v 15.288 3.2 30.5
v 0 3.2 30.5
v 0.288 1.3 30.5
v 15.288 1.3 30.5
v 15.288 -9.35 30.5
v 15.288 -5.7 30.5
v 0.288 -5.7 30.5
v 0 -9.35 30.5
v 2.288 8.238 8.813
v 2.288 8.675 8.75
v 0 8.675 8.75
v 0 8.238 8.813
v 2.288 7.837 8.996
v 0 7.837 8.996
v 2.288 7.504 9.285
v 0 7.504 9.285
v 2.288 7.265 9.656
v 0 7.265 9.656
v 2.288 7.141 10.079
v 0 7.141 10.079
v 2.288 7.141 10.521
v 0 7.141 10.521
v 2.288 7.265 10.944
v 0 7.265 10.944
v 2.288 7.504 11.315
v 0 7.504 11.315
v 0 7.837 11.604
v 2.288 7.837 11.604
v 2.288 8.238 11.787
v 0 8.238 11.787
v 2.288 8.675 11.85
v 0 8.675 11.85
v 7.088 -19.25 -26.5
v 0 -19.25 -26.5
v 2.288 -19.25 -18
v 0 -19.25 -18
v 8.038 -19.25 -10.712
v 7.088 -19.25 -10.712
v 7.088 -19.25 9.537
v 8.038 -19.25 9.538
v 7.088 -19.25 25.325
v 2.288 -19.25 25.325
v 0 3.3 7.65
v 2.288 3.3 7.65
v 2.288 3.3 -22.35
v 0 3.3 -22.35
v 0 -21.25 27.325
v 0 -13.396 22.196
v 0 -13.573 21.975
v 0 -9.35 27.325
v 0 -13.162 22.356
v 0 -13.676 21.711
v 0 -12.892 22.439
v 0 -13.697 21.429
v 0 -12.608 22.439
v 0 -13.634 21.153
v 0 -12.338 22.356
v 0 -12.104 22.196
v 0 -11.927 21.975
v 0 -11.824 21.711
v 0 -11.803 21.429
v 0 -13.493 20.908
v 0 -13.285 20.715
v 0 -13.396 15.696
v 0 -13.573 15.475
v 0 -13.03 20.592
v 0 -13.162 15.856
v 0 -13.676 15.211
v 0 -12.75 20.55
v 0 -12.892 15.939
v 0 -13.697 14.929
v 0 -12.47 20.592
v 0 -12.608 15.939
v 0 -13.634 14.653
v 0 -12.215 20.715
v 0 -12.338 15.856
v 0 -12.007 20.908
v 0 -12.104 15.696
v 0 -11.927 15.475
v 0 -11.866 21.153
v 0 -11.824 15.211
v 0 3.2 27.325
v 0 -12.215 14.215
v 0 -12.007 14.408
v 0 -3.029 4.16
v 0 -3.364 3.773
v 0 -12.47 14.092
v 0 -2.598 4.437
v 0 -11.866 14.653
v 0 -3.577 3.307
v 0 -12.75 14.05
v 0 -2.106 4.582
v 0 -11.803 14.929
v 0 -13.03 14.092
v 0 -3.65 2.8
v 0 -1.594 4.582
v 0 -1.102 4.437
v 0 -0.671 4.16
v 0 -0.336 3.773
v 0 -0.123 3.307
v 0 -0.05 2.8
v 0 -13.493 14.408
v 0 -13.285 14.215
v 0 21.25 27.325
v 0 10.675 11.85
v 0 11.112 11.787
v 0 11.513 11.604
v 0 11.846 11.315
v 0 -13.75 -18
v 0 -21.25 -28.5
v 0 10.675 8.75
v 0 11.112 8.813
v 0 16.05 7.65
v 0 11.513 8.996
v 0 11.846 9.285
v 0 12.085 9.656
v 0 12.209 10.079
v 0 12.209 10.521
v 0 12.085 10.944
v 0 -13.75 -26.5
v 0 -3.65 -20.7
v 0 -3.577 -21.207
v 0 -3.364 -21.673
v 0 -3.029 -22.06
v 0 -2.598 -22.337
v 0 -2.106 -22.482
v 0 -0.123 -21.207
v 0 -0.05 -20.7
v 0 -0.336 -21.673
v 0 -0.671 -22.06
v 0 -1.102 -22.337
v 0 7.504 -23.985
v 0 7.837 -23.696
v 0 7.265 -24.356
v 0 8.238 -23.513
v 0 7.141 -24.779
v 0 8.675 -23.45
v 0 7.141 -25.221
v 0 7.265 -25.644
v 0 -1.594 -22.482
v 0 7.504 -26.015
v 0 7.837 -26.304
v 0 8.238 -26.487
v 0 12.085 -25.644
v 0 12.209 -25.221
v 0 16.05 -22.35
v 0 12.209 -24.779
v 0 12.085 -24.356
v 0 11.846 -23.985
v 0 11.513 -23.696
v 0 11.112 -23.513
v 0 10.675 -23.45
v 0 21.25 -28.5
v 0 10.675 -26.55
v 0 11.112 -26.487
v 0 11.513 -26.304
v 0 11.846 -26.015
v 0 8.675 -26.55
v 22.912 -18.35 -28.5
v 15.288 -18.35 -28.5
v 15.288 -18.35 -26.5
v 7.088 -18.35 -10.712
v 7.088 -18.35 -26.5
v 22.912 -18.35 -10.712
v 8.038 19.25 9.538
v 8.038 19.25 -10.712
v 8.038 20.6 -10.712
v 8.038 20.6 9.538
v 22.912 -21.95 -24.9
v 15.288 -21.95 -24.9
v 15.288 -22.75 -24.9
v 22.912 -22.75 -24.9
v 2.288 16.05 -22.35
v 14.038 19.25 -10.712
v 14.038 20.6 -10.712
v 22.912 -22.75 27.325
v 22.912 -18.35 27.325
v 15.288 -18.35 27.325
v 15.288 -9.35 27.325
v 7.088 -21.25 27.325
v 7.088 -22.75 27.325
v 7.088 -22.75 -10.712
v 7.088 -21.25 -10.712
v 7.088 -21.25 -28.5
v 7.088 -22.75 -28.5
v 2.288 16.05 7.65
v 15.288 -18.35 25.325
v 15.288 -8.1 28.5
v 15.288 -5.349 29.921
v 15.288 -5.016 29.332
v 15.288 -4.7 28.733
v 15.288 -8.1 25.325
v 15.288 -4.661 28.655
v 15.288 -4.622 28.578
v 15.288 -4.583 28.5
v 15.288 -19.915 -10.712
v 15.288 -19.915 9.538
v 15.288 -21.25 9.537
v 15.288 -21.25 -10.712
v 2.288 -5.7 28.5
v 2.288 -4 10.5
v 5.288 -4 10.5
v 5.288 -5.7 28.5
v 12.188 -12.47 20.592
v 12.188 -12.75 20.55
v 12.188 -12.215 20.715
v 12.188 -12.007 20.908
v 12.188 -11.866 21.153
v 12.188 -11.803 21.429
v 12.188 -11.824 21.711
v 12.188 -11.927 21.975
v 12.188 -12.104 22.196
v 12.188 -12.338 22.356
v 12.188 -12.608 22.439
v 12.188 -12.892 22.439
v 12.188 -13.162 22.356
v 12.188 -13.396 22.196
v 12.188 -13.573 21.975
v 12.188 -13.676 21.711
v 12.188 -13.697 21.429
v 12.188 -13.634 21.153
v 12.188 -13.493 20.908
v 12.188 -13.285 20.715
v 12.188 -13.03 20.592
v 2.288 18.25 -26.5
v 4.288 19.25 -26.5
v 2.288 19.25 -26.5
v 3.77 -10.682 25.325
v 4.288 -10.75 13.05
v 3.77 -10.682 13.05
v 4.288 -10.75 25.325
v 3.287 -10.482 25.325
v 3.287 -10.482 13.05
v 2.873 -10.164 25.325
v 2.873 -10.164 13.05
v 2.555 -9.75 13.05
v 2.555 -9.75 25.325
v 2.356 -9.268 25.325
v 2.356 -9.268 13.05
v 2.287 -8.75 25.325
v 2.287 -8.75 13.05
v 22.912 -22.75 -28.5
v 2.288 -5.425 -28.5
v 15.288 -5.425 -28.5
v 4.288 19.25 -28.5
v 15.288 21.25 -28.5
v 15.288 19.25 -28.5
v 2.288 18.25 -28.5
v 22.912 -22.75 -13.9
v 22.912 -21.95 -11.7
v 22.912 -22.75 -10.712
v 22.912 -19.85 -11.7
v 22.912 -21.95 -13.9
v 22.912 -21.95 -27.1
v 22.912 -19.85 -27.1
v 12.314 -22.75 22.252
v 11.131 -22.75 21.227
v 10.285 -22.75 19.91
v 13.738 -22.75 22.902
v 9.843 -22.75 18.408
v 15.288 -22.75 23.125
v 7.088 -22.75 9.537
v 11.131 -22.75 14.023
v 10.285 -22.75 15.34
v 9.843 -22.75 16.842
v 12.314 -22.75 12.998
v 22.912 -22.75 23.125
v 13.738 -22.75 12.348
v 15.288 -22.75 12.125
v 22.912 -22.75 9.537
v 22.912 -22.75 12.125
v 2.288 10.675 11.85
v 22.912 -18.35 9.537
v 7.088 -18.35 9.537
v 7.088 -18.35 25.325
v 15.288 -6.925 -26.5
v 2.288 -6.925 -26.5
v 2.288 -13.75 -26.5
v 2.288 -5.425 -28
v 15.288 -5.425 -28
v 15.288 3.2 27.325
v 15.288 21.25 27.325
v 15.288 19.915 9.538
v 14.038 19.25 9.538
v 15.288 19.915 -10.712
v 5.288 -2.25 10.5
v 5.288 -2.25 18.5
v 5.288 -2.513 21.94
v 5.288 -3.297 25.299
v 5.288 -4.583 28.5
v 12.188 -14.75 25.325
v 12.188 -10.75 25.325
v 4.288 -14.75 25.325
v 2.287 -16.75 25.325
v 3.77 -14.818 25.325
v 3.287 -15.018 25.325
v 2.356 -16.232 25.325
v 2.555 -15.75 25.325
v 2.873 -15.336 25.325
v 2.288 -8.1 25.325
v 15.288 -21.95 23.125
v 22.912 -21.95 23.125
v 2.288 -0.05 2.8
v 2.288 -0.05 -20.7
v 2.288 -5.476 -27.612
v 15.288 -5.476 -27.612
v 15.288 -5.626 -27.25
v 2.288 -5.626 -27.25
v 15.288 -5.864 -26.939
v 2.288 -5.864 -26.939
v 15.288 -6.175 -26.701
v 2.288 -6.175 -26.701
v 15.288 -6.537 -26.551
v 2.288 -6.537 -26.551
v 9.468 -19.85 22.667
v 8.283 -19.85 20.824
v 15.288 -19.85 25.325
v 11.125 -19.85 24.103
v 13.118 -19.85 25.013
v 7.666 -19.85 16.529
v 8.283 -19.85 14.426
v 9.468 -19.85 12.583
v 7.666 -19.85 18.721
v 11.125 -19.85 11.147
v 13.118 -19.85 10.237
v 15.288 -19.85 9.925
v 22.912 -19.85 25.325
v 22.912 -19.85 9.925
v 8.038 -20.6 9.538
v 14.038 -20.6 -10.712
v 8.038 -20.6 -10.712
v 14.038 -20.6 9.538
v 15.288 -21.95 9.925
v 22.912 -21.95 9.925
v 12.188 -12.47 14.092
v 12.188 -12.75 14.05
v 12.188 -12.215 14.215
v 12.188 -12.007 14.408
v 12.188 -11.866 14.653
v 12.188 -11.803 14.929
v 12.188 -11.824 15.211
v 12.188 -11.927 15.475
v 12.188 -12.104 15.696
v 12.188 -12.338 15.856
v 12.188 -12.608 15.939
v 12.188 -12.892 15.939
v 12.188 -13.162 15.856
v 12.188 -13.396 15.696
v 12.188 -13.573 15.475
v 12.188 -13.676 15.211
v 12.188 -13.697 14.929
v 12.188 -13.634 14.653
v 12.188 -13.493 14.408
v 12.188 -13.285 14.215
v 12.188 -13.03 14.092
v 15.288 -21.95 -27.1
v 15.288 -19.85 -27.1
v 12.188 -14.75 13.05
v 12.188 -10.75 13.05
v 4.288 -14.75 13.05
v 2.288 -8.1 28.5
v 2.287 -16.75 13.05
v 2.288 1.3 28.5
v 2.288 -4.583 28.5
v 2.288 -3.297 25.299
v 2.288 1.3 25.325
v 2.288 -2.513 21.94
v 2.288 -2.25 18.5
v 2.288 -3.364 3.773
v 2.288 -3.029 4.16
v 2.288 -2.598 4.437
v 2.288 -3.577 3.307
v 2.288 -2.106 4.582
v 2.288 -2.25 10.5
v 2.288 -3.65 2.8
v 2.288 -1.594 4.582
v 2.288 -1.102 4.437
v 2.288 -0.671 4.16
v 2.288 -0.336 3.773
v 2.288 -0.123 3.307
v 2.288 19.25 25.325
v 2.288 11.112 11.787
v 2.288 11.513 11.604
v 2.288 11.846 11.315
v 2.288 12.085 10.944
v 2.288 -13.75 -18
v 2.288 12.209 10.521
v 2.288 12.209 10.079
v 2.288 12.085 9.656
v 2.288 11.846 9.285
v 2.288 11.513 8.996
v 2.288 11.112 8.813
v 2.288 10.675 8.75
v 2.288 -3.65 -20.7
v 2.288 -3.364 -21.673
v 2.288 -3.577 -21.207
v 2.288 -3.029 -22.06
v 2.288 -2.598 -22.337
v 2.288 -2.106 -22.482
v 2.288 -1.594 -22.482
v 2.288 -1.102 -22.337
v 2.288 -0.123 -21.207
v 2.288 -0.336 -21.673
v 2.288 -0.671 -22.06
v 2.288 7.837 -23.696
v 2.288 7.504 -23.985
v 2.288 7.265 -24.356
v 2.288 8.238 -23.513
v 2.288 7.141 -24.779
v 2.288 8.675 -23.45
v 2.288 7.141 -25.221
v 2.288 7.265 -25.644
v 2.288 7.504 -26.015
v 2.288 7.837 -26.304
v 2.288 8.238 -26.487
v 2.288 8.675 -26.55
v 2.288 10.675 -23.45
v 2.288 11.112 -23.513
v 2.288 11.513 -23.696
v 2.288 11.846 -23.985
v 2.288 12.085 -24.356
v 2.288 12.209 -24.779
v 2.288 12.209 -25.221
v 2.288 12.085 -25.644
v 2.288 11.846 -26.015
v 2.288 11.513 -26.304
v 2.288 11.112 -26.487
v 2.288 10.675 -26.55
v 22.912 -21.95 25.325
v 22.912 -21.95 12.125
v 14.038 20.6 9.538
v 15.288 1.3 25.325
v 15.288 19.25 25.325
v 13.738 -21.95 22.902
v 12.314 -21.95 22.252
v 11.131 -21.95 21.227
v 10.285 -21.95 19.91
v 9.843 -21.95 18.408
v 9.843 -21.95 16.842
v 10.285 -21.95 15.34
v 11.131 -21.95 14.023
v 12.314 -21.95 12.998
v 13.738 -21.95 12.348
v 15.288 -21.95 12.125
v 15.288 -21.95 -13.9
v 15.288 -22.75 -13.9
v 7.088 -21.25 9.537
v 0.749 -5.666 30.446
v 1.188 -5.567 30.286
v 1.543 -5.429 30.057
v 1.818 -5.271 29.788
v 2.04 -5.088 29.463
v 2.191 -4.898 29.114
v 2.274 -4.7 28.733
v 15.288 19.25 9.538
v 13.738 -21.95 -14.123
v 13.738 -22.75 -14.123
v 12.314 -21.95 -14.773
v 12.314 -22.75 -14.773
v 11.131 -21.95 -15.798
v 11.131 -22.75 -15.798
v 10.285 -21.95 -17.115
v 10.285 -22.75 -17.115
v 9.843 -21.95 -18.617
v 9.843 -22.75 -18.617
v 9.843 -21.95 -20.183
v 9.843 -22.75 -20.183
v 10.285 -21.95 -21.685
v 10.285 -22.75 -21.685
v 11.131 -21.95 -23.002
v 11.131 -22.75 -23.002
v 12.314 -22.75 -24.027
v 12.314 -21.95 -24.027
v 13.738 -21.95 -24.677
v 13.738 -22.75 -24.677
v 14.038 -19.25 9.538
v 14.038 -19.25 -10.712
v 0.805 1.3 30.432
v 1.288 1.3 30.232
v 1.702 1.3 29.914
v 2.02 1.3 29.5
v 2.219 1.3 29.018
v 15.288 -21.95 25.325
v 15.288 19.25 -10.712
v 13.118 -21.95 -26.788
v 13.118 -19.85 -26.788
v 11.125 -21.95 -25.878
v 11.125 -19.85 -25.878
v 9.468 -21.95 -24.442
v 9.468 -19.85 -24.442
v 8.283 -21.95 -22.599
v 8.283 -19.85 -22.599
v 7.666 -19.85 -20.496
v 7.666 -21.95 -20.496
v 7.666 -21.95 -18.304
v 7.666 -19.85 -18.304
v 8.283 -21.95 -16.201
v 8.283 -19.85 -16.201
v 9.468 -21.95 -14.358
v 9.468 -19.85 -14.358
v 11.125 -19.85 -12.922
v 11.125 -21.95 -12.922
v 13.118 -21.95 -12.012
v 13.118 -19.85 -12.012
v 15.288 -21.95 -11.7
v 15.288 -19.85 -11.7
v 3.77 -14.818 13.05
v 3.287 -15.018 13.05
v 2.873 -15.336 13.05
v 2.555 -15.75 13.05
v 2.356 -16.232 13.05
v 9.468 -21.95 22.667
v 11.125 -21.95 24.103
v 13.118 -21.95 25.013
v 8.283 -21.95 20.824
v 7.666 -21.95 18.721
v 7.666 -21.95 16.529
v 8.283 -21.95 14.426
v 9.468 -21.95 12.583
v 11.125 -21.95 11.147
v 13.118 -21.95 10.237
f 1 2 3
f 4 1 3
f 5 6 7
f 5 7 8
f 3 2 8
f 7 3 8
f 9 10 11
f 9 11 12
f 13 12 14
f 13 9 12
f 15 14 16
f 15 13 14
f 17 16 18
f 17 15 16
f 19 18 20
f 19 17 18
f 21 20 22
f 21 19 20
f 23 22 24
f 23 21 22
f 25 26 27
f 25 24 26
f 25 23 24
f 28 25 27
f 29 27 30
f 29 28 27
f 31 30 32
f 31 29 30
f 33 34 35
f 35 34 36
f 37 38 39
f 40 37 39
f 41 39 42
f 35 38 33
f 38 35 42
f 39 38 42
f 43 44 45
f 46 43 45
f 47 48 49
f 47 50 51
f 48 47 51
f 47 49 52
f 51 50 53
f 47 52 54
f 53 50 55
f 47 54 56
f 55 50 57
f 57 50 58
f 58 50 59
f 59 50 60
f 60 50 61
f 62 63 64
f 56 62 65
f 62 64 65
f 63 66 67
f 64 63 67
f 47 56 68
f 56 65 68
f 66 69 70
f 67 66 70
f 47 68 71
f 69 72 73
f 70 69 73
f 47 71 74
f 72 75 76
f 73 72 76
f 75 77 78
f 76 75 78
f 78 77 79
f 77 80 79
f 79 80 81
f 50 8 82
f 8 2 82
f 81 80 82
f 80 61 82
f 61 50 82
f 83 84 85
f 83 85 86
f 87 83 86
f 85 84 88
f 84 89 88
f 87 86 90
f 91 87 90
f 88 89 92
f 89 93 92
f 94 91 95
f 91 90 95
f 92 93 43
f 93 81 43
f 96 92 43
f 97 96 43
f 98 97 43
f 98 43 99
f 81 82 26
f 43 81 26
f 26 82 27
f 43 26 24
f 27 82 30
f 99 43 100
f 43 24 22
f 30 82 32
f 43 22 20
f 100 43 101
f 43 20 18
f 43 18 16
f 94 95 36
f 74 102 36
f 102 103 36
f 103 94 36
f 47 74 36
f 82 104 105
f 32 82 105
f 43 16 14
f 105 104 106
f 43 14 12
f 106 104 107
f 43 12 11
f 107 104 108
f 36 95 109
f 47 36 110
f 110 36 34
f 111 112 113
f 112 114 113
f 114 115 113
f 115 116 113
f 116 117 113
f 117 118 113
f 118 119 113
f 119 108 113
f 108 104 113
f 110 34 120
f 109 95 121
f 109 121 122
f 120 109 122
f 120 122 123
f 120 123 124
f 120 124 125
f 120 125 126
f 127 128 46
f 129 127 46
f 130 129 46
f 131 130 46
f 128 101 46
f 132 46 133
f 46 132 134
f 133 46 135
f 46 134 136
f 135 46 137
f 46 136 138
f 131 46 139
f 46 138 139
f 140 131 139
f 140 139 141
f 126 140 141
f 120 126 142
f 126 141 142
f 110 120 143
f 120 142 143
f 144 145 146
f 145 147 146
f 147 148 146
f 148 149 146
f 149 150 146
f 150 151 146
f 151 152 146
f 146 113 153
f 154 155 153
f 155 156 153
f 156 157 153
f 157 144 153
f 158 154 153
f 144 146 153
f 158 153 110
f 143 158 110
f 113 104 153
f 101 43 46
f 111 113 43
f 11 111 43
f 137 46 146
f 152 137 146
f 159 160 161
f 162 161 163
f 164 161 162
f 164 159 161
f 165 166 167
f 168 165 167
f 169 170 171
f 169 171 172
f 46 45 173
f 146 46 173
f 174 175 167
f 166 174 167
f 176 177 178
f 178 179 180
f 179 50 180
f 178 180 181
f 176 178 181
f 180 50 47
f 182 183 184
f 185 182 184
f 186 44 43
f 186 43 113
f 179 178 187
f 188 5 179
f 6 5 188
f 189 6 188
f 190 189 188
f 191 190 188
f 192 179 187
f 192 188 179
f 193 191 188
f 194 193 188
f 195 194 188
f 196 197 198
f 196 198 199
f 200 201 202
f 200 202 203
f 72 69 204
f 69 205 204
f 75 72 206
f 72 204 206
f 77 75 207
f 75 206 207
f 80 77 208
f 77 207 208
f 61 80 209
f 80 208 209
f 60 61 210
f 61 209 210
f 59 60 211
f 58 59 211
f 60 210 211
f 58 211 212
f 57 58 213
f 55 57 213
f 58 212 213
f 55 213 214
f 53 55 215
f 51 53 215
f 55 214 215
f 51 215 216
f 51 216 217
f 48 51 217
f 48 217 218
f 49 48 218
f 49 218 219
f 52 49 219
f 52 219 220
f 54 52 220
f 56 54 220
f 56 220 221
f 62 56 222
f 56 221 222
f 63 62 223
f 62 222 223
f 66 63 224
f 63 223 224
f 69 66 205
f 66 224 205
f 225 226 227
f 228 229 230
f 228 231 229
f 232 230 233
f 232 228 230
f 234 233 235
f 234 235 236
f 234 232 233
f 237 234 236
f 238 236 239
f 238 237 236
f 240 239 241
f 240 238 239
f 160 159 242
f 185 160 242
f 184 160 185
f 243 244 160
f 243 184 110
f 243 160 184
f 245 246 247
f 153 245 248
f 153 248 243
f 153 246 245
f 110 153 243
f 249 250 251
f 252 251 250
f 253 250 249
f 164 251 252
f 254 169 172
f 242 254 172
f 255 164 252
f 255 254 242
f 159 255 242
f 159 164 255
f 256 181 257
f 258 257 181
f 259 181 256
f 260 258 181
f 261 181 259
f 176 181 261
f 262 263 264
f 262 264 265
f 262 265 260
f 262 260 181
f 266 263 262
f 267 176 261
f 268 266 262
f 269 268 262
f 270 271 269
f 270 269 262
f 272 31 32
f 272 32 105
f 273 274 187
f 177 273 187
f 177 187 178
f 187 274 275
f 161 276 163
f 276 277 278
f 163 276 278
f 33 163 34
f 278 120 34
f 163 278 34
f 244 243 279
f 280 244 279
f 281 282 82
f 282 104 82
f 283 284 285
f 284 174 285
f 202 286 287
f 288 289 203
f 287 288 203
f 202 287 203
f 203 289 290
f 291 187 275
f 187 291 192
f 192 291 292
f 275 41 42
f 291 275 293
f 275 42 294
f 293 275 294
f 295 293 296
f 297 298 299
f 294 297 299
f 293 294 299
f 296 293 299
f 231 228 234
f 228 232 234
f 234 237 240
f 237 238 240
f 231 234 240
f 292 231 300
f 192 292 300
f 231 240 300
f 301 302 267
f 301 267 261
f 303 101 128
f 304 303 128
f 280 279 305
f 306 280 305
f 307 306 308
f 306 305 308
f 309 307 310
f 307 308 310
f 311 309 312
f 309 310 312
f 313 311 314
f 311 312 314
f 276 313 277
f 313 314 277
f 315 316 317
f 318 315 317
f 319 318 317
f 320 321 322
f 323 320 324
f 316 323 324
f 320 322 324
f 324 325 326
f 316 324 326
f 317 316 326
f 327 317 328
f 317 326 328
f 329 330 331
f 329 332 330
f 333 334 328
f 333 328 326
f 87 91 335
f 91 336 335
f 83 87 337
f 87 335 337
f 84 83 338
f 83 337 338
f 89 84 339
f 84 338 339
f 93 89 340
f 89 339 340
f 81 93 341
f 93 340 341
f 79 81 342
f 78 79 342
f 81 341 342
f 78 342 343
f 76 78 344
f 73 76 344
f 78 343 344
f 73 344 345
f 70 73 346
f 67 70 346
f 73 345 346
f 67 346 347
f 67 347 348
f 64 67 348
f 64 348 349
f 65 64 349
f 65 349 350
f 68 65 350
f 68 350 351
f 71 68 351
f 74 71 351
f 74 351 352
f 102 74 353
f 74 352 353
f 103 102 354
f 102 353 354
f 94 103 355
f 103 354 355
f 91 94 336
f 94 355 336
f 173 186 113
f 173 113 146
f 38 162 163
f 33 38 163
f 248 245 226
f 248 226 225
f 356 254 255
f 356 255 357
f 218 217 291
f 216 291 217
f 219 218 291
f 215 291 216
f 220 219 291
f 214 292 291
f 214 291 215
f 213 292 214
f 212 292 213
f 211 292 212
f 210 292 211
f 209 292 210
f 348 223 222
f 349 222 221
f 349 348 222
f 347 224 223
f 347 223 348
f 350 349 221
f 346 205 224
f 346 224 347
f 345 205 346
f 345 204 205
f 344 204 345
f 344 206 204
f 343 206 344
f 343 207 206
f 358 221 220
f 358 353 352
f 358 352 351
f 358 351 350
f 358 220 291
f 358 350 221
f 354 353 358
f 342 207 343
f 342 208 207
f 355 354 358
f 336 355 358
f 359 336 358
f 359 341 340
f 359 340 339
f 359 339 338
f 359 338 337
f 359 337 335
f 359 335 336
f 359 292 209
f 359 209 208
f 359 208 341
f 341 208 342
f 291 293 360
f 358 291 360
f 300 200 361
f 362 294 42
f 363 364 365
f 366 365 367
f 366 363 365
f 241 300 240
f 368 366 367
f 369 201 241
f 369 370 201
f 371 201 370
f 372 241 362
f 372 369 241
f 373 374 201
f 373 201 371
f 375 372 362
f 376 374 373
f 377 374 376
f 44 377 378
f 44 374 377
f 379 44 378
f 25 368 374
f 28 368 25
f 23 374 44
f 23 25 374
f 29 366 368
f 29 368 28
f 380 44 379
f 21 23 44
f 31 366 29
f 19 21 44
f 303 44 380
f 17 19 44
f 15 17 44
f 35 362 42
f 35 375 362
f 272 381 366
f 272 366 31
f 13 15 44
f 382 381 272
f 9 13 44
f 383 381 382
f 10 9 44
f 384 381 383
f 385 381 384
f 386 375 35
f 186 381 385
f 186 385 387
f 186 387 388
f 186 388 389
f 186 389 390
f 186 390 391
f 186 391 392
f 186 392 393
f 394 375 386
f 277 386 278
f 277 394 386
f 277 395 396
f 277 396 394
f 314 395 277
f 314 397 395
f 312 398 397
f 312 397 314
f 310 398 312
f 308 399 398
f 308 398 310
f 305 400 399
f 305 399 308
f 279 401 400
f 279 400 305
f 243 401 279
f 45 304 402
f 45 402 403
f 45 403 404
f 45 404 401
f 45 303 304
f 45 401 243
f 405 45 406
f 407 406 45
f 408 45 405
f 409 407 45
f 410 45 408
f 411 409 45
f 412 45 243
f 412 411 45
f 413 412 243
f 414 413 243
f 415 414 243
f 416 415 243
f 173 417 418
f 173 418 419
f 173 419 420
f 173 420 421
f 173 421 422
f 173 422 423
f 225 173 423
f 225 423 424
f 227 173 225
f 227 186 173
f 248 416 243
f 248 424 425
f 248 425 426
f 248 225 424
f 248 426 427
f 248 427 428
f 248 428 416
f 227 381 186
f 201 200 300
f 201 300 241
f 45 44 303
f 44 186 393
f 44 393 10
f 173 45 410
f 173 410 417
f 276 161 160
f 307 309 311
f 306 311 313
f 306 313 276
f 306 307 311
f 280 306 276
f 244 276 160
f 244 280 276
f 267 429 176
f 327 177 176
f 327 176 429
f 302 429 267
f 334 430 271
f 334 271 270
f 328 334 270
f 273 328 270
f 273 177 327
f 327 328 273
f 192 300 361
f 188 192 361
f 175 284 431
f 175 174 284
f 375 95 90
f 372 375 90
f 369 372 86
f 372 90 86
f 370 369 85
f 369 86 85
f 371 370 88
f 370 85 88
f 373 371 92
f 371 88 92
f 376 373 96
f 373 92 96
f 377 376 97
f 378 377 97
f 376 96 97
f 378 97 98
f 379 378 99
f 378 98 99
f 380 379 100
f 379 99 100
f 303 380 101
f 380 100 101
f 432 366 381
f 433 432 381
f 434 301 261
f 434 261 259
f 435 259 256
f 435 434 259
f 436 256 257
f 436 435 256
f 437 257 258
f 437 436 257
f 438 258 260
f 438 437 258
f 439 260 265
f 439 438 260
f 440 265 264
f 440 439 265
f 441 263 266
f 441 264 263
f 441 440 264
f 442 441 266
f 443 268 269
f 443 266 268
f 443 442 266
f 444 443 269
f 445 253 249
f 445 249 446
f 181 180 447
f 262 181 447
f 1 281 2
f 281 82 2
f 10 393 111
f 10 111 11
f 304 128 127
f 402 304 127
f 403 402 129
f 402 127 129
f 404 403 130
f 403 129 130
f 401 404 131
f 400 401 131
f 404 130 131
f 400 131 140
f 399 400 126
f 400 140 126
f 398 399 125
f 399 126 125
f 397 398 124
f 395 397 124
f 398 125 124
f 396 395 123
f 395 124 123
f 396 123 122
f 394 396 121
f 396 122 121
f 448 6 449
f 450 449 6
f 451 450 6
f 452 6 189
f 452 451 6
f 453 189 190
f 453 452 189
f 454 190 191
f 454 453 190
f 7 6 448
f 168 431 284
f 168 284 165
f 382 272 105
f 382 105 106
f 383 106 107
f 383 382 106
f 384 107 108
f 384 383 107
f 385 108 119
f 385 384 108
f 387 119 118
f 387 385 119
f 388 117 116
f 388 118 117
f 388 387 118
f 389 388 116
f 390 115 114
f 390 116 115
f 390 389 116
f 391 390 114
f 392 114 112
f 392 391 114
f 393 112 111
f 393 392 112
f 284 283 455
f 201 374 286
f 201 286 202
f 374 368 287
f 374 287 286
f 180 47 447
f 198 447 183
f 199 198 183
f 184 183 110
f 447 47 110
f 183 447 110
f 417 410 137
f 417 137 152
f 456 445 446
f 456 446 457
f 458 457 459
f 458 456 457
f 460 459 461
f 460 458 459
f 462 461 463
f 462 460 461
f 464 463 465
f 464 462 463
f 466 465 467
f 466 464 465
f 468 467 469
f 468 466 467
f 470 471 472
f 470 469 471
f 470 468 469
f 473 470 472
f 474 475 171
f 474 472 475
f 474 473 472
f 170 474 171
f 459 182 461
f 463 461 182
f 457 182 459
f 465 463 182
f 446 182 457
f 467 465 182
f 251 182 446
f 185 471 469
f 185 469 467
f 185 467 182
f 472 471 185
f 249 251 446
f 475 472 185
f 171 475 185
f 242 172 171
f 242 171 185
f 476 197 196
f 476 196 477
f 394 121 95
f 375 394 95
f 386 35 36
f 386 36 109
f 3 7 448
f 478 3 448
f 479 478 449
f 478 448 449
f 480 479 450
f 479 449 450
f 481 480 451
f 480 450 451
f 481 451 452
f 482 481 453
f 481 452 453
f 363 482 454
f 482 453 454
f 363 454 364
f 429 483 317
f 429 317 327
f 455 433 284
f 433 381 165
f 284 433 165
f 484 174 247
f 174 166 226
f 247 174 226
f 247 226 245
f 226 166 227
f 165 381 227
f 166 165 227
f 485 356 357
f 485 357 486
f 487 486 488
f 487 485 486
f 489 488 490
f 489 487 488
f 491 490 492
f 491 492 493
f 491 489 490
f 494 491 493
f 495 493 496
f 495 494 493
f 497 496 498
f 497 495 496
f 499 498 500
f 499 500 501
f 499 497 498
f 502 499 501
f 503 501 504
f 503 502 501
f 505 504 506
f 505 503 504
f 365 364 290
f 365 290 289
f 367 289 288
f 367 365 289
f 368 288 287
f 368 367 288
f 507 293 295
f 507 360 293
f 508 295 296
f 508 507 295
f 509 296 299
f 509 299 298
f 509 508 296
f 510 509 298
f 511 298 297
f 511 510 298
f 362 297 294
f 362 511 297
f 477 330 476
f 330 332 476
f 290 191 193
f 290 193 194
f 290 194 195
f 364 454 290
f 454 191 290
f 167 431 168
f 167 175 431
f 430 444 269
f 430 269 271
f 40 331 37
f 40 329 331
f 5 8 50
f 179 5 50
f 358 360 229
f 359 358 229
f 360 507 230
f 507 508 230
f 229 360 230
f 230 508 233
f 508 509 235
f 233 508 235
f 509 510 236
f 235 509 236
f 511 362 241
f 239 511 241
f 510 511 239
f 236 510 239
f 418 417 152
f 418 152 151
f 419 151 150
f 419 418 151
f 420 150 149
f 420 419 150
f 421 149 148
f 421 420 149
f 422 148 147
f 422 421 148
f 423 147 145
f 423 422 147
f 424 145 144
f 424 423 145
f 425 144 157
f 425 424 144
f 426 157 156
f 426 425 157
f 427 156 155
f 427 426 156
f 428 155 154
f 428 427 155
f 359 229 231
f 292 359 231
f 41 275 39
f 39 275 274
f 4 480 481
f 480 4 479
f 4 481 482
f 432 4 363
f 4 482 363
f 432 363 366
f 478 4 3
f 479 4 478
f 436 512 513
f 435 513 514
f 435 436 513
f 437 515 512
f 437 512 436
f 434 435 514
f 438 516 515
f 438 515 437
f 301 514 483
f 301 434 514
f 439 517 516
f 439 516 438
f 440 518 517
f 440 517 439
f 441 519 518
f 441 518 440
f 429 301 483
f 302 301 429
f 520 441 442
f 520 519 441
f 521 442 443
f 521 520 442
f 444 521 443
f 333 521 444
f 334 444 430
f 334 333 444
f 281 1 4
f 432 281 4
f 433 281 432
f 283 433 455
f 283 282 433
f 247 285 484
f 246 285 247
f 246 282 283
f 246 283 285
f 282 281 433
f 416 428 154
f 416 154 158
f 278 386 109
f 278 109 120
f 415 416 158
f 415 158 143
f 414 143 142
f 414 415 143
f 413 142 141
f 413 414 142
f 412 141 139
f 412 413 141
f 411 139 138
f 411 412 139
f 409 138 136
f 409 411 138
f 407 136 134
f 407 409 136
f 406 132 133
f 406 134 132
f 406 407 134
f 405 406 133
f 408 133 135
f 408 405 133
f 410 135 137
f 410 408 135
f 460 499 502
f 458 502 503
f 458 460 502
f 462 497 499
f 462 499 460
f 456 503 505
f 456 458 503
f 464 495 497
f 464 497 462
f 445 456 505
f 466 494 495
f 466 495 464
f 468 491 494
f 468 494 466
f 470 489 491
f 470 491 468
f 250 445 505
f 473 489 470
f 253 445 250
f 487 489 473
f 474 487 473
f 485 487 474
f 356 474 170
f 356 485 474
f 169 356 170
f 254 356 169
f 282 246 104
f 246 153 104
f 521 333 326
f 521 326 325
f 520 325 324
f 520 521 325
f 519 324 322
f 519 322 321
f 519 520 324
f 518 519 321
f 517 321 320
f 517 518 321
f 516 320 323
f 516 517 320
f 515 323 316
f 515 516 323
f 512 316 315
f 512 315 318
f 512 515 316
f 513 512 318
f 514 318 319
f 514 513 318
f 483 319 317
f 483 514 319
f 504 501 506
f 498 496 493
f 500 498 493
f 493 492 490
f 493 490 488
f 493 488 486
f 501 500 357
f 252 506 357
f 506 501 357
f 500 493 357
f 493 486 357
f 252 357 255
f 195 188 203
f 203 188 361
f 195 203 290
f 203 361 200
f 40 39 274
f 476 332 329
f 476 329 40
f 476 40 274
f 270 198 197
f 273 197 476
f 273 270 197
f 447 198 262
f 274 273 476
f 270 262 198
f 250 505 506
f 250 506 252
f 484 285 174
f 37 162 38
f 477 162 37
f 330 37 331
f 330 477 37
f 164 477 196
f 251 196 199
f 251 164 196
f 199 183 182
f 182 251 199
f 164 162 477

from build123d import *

# Parameters (mm, degrees)
MAIN_EXTRUDE_DEPTH            = 2.2875
WALLS_START                   = 2.2875
WALLS_DEPTH                   = 13
CORNER_SUPPORT_DEPTH          = 2
SKETCH2_R                     = 0.95
SKETCH2_W                     = 2.4
SKETCH2_H                     = 4
SKETCH2_W_2                   = 1
SWITCH_SPACER_DEPTH           = 9.9
ARM_SUPPORT_EXTRUDE_DEPTH     = 3
ARM_SUPPORT_CURVE_DEPTH       = 40.380356778
FILLET4_R                     = 2
FILLET3_R                     = 2
SKETCH2_5_R                   = 0.95
SWITCH_MOUNT_HOLES_DEPTH      = 40.380356889
SWITCH_MOUNT_HOLES_DEPTH_BACK = 40.380356889
SKETCH4_W                     = 8.5
SKETCH4_H                     = 5.5
WIRE_HOLE_DEPTH               = 40.380356889
SKETCH25_W                    = 6
SKETCH25_H                    = 1.35
FEMALE_SNAP_DEPTH             = 10.125
SKETCH5_W                     = 30
SKETCH5_H                     = 12.75
SERVO_HOLE_DEPTH              = 40.380356889
SKETCH30_W                    = 15.7875
SKETCH30_H                    = 0.9
SKETCH30_W_2                  = 17.7875
SKETCH30_H_2                  = 1.5
MAGNET_EXTRUDE_1_DEPTH        = 7.625
MAGNET_EXTRUDE_1_DEPTH_BACK   = 8.2
SKETCH29_R                    = 7.7
MAGNET_HOLE_DEPTH             = 2.1
SKETCH31_R                    = 5.5
MAGNET_THRU_HOLE_DEPTH        = 58.632218961


with BuildPart() as part:
    # Sketch1 → Main Extrude (new body)
    with BuildSketch(Plane(origin=(0, 0, 0), x_dir=(0, 0, -1), z_dir=(1, 0, 0))):
        Polygon((-30.5, -9.35), (-27.325, -9.35), (-27.325, -21.25), (28.5, -21.25), (28.5, 21.25), (-27.325, 21.25), (-27.325, 3.2), (-30.5, 3.2), align=None)
        with BuildLine():
            Line((20.7, -3.65), (-2.8, -3.65))
            ThreePointArc((-2.8, -3.65), (-4.6, -1.85), (-2.8, -0.05))
            Line((-2.8, -0.05), (20.7, -0.05))
            ThreePointArc((20.7, -0.05), (22.5, -1.85), (20.7, -3.65))
        make_face(mode=Mode.SUBTRACT)
    extrude(amount=MAIN_EXTRUDE_DEPTH)

    # Sketch1_3 → Walls (add)
    with BuildSketch(Plane(origin=(0, 0, 0), x_dir=(0, 0, -1), z_dir=(1, 0, 0)).offset(WALLS_START)):
        Polygon((-25.325, 19.25), (28.5, 19.25), (28.5, 21.25), (-27.325, 21.25), (-27.325, 3.2), (-30.5, 3.2), (-30.5, 1.3), (-25.325, 1.3), align=None)
        with BuildLine():
            Line((28.5, -5.425), (28, -5.425))
            ThreePointArc((28, -5.425), (26.939339828, -5.864339828), (26.5, -6.925))
            Line((26.5, -6.925), (26.5, -19.25))
            Line((26.5, -19.25), (-25.325, -19.25))
            Line((-25.325, -19.25), (-25.325, -8.1))
            Line((-25.325, -8.1), (-28.5, -8.1))
            Line((-28.5, -8.1), (-28.5, -4.45))
            Line((-28.5, -4.45), (-30.5, -4.45))
            Line((-30.5, -4.45), (-30.5, -9.35))
            Line((-30.5, -9.35), (-27.325, -9.35))
            Line((-27.325, -9.35), (-27.325, -21.25))
            Line((-27.325, -21.25), (28.5, -21.25))
            Line((28.5, -21.25), (28.5, -5.425))
        make_face()
    extrude(amount=WALLS_DEPTH)

    # Sketch22 → Corner Support (add)
    with BuildSketch(Plane(origin=(0, 0, -28.5), x_dir=(-1, 0, 0), z_dir=(0, 0, -1))):
        Polygon((-4.2875, 19.25), (-2.2875, 18.25), (-2.2875, 19.25), align=None)
    extrude(amount=-CORNER_SUPPORT_DEPTH)

    # Sketch2 → Switch Spacer (add)
    with BuildSketch(Plane(origin=(2.2875, 0, 0), x_dir=(0, 0, -1), z_dir=(1, 0, 0))):
        Polygon((-14.05, -10.75), (-17.05, -10.75), (-17.05, -14.75), (-14.05, -14.75), (-14.05, -12.75), align=None)
        with Locations((-15, -12.75)):
            Circle(SKETCH2_R, mode=Mode.SUBTRACT)
        with Locations((-15, -12.75)):
            Circle(SKETCH2_R)
        Polygon((-19.45, -10.75), (-22.45, -10.75), (-22.45, -12.75), (-22.45, -14.75), (-19.45, -14.75), align=None)
        with BuildLine():
            ThreePointArc((-20.55, -12.75), (-21.5, -13.7), (-22.45, -12.75))
            ThreePointArc((-22.45, -12.75), (-21.5, -11.8), (-20.55, -12.75))
        make_face(mode=Mode.SUBTRACT)
        with Locations((-21.5, -12.75)):
            Circle(SKETCH2_R)
        Polygon((-22.45, -12.75), (-22.45, -10.75), (-25.325, -10.75), (-25.325, -14.75), (-22.45, -14.75), align=None)
        with Locations((-18.25, -12.75)):
            Rectangle(SKETCH2_W, SKETCH2_H)
        with Locations((-13.55, -12.75)):
            Rectangle(SKETCH2_W_2, SKETCH2_H)
    extrude(amount=SWITCH_SPACER_DEPTH)

    # Sketch3 → Arm Support Extrude (add)
    with BuildSketch(Plane(origin=(2.2875, 0, 0), x_dir=(0, 0, -1), z_dir=(1, 0, 0))):
        with BuildLine():
            Line((-18.5, -2.25), (-10.5, -2.25))
            Line((-10.5, -2.25), (-10.5, -4))
            Line((-10.5, -4), (-28.5, -5.7))
            Line((-28.5, -5.7), (-30.5, -5.7))
            ThreePointArc((-30.5, -5.7), (-24.743046131, -3.129622151), (-18.5, -2.25))
        make_face()
    extrude(amount=ARM_SUPPORT_EXTRUDE_DEPTH)

    # Sketch7 → Arm Support Curve (cut, through all)
    with BuildSketch(Plane(origin=(2.2875, 0, 0), x_dir=(0, 0, -1), z_dir=(1, 0, 0))):
        with BuildLine():
            Line((-28.5, -4.583410824), (-28.5, -4.45))
            Line((-28.5, -4.45), (-30.5, -4.45))
            Line((-30.5, -4.45), (-30.5, -5.7))
            ThreePointArc((-30.5, -5.7), (-29.627655409, -5.180138898), (-28.73283292, -4.7))
            ThreePointArc((-28.73283292, -4.7), (-28.616584416, -4.641369997), (-28.5, -4.583410824))
        make_face()
    extrude(amount=ARM_SUPPORT_CURVE_DEPTH, mode=Mode.SUBTRACT)

    # Fillet4
    fillet4_edges = [part.edges().sort_by_distance(p)[0] for p in [
        (2.2875, -2.2, 30.5),
    ]]
    fillet(fillet4_edges, radius=FILLET4_R)

    # Fillet3
    fillet3_edges = [part.edges().sort_by_distance(p)[0] for p in [
        (2.2875, -14.75, 19.1875),
        (2.2875, -10.75, 19.1875),
    ]]
    fillet(fillet3_edges, radius=FILLET3_R)

    # Sketch2_5 → Switch Mount Holes (cut, two sides)
    with BuildSketch(Plane(origin=(2.2875, 0, 0), x_dir=(0, 0, -1), z_dir=(1, 0, 0))) as switch_mount_holes_sk:
        with Locations((-21.5, -12.75)):
            Circle(SKETCH2_5_R)
        with Locations((-15, -12.75)):
            Circle(SKETCH2_5_R)
    extrude(amount=SWITCH_MOUNT_HOLES_DEPTH, mode=Mode.SUBTRACT)
    extrude(switch_mount_holes_sk.sketch, amount=-SWITCH_MOUNT_HOLES_DEPTH_BACK, mode=Mode.SUBTRACT)

    # Sketch4 → Wire Hole (cut, through all)
    with BuildSketch(Plane(origin=(2.2875, 0, 0), x_dir=(0, 0, -1), z_dir=(1, 0, 0))):
        with Locations((22.25, -16.5)):
            Rectangle(SKETCH4_W, SKETCH4_H)
    extrude(amount=-WIRE_HOLE_DEPTH, mode=Mode.SUBTRACT)

    # Sketch25 → Female Snap (cut, symmetric)
    with BuildSketch(Plane(origin=(0, 0, -0.5875), x_dir=(-1, 0, 0), z_dir=(0, 0, -1))):
        with Locations((-11.0375, -19.925)):
            Rectangle(SKETCH25_W, SKETCH25_H)
        Polygon((-15.2875, -19.25), (-15.2875, -19.91463679), (-14.0375, -19.25), align=None)
        with Locations((-11.0375, 19.925)):
            Rectangle(SKETCH25_W, SKETCH25_H)
        Polygon((-15.2875, 19.91463679), (-15.2875, 19.25), (-14.0375, 19.25), align=None)
    extrude(amount=FEMALE_SNAP_DEPTH, both=True, mode=Mode.SUBTRACT)

    # Sketch5 → Servo Hole (cut, through all)
    with BuildSketch(Plane(origin=(2.2875, 0, 0), x_dir=(0, 0, -1), z_dir=(1, 0, 0))):
        with Locations((7.35, 9.675)):
            Rectangle(SKETCH5_W, SKETCH5_H)
        with BuildLine():
            Line((-8.75, 10.675), (-8.75, 8.675))
            ThreePointArc((-8.75, 8.675), (-10.3, 7.125), (-11.85, 8.675))
            Line((-11.85, 8.675), (-11.85, 10.675))
            ThreePointArc((-11.85, 10.675), (-10.3, 12.225), (-8.75, 10.675))
        make_face()
        with BuildLine():
            Line((26.55, 10.675), (26.55, 8.675))
            ThreePointArc((26.55, 8.675), (25, 7.125), (23.45, 8.675))
            Line((23.45, 8.675), (23.45, 10.675))
            ThreePointArc((23.45, 10.675), (25, 12.225), (26.55, 10.675))
        make_face()
    extrude(amount=-SERVO_HOLE_DEPTH, mode=Mode.SUBTRACT)

    # Sketch30 → Magnet Extrude 1 (add, two sides)
    with BuildSketch(Plane(origin=(15.2875, 0, 0), x_dir=(0, 0, -1), z_dir=(1, 0, 0))) as magnet_extrude_1_sk:
        Polygon((-27.325, -18.35), (-27.325, -21.25), (-9.5375, -21.25), (-9.5375, -19.91463679), (-9.5375, -19.25), (-25.325, -19.25), (-25.325, -18.35), align=None)
        with Locations((-17.43125, -18.8)):
            Rectangle(SKETCH30_W, SKETCH30_H)
        with Locations((19.60625, -22)):
            Rectangle(SKETCH30_W_2, SKETCH30_H_2)
        Polygon((10.7125, -19.91463679), (10.7125, -21.25), (28.5, -21.25), (28.5, -18.35), (26.5, -18.35), (26.5, -19.25), (10.7125, -19.25), align=None)
        with Locations((-18.43125, -22)):
            Rectangle(SKETCH30_W_2, SKETCH30_H_2)
        with Locations((18.60625, -18.8)):
            Rectangle(SKETCH30_W, SKETCH30_H)
    extrude(amount=MAGNET_EXTRUDE_1_DEPTH)
    extrude(magnet_extrude_1_sk.sketch, amount=-MAGNET_EXTRUDE_1_DEPTH_BACK)

    # Sketch29 → Magnet Hole (cut)
    with BuildSketch(Plane(origin=(0, -21.95, 0), x_dir=(1, 0, 0), z_dir=(0, 1, 0))):
        with Locations((15.2875, -17.625)):
            Circle(SKETCH29_R)
        with BuildLine():
            ThreePointArc((22.9125, -18.697089082), (20.338980677, -23.436414885), (15.2875, -25.325))
            Line((15.2875, -25.325), (22.9125, -25.325))
            Line((22.9125, -25.325), (22.9125, -18.697089082))
        make_face()
        with BuildLine():
            Line((22.9125, -9.925), (15.2875, -9.925))
            ThreePointArc((15.2875, -9.925), (20.338980677, -11.813585115), (22.9125, -16.552910918))
            Line((22.9125, -16.552910918), (22.9125, -9.925))
        make_face()
        with Locations((15.2875, 19.4)):
            Circle(SKETCH29_R)
        with BuildLine():
            ThreePointArc((22.9125, 18.327910918), (20.338980677, 13.588585115), (15.2875, 11.7))
            Line((15.2875, 11.7), (22.9125, 11.7))
            Line((22.9125, 11.7), (22.9125, 18.327910918))
        make_face()
        with BuildLine():
            Line((22.9125, 27.1), (15.2875, 27.1))
            ThreePointArc((15.2875, 27.1), (20.338980677, 25.211414885), (22.9125, 20.472089082))
            Line((22.9125, 20.472089082), (22.9125, 27.1))
        make_face()
        with BuildLine():
            ThreePointArc((22.9875, -17.625), (22.968727116, -17.087645368), (22.9125, -16.552910918))
            Line((22.9125, -16.552910918), (22.9125, -18.697089082))
            ThreePointArc((22.9125, -18.697089082), (22.968727116, -18.162354632), (22.9875, -17.625))
        make_face()
        with BuildLine():
            Line((22.9125, 20.472089082), (22.9125, 18.327910918))
            ThreePointArc((22.9125, 18.327910918), (22.968727116, 18.862645368), (22.9875, 19.4))
            ThreePointArc((22.9875, 19.4), (22.968727116, 19.937354632), (22.9125, 20.472089082))
        make_face()
    extrude(amount=MAGNET_HOLE_DEPTH, mode=Mode.SUBTRACT)

    # Sketch31 → Magnet Thru Hole (cut, through all)
    with BuildSketch(Plane.XZ.offset(21.95)):
        with Locations((15.2875, 17.625)):
            Circle(SKETCH31_R)
        with BuildLine():
            Line((22.9125, 23.125), (15.2875, 23.125))
            ThreePointArc((15.2875, 23.125), (19.176587297, 21.514087297), (20.7875, 17.625))
            ThreePointArc((20.7875, 17.625), (19.176587297, 13.735912703), (15.2875, 12.125))
            Line((15.2875, 12.125), (22.9125, 12.125))
            Line((22.9125, 12.125), (22.9125, 23.125))
        make_face()
        with Locations((15.2875, -19.4)):
            Circle(SKETCH31_R)
        with BuildLine():
            Line((22.9125, -13.9), (15.2875, -13.9))
            ThreePointArc((15.2875, -13.9), (19.176587297, -15.510912703), (20.7875, -19.4))
            ThreePointArc((20.7875, -19.4), (19.176587297, -23.289087297), (15.2875, -24.9))
            Line((15.2875, -24.9), (22.9125, -24.9))
            Line((22.9125, -24.9), (22.9125, -13.9))
        make_face()
    extrude(amount=MAGNET_THRU_HOLE_DEPTH, mode=Mode.SUBTRACT)


solid = part.part
